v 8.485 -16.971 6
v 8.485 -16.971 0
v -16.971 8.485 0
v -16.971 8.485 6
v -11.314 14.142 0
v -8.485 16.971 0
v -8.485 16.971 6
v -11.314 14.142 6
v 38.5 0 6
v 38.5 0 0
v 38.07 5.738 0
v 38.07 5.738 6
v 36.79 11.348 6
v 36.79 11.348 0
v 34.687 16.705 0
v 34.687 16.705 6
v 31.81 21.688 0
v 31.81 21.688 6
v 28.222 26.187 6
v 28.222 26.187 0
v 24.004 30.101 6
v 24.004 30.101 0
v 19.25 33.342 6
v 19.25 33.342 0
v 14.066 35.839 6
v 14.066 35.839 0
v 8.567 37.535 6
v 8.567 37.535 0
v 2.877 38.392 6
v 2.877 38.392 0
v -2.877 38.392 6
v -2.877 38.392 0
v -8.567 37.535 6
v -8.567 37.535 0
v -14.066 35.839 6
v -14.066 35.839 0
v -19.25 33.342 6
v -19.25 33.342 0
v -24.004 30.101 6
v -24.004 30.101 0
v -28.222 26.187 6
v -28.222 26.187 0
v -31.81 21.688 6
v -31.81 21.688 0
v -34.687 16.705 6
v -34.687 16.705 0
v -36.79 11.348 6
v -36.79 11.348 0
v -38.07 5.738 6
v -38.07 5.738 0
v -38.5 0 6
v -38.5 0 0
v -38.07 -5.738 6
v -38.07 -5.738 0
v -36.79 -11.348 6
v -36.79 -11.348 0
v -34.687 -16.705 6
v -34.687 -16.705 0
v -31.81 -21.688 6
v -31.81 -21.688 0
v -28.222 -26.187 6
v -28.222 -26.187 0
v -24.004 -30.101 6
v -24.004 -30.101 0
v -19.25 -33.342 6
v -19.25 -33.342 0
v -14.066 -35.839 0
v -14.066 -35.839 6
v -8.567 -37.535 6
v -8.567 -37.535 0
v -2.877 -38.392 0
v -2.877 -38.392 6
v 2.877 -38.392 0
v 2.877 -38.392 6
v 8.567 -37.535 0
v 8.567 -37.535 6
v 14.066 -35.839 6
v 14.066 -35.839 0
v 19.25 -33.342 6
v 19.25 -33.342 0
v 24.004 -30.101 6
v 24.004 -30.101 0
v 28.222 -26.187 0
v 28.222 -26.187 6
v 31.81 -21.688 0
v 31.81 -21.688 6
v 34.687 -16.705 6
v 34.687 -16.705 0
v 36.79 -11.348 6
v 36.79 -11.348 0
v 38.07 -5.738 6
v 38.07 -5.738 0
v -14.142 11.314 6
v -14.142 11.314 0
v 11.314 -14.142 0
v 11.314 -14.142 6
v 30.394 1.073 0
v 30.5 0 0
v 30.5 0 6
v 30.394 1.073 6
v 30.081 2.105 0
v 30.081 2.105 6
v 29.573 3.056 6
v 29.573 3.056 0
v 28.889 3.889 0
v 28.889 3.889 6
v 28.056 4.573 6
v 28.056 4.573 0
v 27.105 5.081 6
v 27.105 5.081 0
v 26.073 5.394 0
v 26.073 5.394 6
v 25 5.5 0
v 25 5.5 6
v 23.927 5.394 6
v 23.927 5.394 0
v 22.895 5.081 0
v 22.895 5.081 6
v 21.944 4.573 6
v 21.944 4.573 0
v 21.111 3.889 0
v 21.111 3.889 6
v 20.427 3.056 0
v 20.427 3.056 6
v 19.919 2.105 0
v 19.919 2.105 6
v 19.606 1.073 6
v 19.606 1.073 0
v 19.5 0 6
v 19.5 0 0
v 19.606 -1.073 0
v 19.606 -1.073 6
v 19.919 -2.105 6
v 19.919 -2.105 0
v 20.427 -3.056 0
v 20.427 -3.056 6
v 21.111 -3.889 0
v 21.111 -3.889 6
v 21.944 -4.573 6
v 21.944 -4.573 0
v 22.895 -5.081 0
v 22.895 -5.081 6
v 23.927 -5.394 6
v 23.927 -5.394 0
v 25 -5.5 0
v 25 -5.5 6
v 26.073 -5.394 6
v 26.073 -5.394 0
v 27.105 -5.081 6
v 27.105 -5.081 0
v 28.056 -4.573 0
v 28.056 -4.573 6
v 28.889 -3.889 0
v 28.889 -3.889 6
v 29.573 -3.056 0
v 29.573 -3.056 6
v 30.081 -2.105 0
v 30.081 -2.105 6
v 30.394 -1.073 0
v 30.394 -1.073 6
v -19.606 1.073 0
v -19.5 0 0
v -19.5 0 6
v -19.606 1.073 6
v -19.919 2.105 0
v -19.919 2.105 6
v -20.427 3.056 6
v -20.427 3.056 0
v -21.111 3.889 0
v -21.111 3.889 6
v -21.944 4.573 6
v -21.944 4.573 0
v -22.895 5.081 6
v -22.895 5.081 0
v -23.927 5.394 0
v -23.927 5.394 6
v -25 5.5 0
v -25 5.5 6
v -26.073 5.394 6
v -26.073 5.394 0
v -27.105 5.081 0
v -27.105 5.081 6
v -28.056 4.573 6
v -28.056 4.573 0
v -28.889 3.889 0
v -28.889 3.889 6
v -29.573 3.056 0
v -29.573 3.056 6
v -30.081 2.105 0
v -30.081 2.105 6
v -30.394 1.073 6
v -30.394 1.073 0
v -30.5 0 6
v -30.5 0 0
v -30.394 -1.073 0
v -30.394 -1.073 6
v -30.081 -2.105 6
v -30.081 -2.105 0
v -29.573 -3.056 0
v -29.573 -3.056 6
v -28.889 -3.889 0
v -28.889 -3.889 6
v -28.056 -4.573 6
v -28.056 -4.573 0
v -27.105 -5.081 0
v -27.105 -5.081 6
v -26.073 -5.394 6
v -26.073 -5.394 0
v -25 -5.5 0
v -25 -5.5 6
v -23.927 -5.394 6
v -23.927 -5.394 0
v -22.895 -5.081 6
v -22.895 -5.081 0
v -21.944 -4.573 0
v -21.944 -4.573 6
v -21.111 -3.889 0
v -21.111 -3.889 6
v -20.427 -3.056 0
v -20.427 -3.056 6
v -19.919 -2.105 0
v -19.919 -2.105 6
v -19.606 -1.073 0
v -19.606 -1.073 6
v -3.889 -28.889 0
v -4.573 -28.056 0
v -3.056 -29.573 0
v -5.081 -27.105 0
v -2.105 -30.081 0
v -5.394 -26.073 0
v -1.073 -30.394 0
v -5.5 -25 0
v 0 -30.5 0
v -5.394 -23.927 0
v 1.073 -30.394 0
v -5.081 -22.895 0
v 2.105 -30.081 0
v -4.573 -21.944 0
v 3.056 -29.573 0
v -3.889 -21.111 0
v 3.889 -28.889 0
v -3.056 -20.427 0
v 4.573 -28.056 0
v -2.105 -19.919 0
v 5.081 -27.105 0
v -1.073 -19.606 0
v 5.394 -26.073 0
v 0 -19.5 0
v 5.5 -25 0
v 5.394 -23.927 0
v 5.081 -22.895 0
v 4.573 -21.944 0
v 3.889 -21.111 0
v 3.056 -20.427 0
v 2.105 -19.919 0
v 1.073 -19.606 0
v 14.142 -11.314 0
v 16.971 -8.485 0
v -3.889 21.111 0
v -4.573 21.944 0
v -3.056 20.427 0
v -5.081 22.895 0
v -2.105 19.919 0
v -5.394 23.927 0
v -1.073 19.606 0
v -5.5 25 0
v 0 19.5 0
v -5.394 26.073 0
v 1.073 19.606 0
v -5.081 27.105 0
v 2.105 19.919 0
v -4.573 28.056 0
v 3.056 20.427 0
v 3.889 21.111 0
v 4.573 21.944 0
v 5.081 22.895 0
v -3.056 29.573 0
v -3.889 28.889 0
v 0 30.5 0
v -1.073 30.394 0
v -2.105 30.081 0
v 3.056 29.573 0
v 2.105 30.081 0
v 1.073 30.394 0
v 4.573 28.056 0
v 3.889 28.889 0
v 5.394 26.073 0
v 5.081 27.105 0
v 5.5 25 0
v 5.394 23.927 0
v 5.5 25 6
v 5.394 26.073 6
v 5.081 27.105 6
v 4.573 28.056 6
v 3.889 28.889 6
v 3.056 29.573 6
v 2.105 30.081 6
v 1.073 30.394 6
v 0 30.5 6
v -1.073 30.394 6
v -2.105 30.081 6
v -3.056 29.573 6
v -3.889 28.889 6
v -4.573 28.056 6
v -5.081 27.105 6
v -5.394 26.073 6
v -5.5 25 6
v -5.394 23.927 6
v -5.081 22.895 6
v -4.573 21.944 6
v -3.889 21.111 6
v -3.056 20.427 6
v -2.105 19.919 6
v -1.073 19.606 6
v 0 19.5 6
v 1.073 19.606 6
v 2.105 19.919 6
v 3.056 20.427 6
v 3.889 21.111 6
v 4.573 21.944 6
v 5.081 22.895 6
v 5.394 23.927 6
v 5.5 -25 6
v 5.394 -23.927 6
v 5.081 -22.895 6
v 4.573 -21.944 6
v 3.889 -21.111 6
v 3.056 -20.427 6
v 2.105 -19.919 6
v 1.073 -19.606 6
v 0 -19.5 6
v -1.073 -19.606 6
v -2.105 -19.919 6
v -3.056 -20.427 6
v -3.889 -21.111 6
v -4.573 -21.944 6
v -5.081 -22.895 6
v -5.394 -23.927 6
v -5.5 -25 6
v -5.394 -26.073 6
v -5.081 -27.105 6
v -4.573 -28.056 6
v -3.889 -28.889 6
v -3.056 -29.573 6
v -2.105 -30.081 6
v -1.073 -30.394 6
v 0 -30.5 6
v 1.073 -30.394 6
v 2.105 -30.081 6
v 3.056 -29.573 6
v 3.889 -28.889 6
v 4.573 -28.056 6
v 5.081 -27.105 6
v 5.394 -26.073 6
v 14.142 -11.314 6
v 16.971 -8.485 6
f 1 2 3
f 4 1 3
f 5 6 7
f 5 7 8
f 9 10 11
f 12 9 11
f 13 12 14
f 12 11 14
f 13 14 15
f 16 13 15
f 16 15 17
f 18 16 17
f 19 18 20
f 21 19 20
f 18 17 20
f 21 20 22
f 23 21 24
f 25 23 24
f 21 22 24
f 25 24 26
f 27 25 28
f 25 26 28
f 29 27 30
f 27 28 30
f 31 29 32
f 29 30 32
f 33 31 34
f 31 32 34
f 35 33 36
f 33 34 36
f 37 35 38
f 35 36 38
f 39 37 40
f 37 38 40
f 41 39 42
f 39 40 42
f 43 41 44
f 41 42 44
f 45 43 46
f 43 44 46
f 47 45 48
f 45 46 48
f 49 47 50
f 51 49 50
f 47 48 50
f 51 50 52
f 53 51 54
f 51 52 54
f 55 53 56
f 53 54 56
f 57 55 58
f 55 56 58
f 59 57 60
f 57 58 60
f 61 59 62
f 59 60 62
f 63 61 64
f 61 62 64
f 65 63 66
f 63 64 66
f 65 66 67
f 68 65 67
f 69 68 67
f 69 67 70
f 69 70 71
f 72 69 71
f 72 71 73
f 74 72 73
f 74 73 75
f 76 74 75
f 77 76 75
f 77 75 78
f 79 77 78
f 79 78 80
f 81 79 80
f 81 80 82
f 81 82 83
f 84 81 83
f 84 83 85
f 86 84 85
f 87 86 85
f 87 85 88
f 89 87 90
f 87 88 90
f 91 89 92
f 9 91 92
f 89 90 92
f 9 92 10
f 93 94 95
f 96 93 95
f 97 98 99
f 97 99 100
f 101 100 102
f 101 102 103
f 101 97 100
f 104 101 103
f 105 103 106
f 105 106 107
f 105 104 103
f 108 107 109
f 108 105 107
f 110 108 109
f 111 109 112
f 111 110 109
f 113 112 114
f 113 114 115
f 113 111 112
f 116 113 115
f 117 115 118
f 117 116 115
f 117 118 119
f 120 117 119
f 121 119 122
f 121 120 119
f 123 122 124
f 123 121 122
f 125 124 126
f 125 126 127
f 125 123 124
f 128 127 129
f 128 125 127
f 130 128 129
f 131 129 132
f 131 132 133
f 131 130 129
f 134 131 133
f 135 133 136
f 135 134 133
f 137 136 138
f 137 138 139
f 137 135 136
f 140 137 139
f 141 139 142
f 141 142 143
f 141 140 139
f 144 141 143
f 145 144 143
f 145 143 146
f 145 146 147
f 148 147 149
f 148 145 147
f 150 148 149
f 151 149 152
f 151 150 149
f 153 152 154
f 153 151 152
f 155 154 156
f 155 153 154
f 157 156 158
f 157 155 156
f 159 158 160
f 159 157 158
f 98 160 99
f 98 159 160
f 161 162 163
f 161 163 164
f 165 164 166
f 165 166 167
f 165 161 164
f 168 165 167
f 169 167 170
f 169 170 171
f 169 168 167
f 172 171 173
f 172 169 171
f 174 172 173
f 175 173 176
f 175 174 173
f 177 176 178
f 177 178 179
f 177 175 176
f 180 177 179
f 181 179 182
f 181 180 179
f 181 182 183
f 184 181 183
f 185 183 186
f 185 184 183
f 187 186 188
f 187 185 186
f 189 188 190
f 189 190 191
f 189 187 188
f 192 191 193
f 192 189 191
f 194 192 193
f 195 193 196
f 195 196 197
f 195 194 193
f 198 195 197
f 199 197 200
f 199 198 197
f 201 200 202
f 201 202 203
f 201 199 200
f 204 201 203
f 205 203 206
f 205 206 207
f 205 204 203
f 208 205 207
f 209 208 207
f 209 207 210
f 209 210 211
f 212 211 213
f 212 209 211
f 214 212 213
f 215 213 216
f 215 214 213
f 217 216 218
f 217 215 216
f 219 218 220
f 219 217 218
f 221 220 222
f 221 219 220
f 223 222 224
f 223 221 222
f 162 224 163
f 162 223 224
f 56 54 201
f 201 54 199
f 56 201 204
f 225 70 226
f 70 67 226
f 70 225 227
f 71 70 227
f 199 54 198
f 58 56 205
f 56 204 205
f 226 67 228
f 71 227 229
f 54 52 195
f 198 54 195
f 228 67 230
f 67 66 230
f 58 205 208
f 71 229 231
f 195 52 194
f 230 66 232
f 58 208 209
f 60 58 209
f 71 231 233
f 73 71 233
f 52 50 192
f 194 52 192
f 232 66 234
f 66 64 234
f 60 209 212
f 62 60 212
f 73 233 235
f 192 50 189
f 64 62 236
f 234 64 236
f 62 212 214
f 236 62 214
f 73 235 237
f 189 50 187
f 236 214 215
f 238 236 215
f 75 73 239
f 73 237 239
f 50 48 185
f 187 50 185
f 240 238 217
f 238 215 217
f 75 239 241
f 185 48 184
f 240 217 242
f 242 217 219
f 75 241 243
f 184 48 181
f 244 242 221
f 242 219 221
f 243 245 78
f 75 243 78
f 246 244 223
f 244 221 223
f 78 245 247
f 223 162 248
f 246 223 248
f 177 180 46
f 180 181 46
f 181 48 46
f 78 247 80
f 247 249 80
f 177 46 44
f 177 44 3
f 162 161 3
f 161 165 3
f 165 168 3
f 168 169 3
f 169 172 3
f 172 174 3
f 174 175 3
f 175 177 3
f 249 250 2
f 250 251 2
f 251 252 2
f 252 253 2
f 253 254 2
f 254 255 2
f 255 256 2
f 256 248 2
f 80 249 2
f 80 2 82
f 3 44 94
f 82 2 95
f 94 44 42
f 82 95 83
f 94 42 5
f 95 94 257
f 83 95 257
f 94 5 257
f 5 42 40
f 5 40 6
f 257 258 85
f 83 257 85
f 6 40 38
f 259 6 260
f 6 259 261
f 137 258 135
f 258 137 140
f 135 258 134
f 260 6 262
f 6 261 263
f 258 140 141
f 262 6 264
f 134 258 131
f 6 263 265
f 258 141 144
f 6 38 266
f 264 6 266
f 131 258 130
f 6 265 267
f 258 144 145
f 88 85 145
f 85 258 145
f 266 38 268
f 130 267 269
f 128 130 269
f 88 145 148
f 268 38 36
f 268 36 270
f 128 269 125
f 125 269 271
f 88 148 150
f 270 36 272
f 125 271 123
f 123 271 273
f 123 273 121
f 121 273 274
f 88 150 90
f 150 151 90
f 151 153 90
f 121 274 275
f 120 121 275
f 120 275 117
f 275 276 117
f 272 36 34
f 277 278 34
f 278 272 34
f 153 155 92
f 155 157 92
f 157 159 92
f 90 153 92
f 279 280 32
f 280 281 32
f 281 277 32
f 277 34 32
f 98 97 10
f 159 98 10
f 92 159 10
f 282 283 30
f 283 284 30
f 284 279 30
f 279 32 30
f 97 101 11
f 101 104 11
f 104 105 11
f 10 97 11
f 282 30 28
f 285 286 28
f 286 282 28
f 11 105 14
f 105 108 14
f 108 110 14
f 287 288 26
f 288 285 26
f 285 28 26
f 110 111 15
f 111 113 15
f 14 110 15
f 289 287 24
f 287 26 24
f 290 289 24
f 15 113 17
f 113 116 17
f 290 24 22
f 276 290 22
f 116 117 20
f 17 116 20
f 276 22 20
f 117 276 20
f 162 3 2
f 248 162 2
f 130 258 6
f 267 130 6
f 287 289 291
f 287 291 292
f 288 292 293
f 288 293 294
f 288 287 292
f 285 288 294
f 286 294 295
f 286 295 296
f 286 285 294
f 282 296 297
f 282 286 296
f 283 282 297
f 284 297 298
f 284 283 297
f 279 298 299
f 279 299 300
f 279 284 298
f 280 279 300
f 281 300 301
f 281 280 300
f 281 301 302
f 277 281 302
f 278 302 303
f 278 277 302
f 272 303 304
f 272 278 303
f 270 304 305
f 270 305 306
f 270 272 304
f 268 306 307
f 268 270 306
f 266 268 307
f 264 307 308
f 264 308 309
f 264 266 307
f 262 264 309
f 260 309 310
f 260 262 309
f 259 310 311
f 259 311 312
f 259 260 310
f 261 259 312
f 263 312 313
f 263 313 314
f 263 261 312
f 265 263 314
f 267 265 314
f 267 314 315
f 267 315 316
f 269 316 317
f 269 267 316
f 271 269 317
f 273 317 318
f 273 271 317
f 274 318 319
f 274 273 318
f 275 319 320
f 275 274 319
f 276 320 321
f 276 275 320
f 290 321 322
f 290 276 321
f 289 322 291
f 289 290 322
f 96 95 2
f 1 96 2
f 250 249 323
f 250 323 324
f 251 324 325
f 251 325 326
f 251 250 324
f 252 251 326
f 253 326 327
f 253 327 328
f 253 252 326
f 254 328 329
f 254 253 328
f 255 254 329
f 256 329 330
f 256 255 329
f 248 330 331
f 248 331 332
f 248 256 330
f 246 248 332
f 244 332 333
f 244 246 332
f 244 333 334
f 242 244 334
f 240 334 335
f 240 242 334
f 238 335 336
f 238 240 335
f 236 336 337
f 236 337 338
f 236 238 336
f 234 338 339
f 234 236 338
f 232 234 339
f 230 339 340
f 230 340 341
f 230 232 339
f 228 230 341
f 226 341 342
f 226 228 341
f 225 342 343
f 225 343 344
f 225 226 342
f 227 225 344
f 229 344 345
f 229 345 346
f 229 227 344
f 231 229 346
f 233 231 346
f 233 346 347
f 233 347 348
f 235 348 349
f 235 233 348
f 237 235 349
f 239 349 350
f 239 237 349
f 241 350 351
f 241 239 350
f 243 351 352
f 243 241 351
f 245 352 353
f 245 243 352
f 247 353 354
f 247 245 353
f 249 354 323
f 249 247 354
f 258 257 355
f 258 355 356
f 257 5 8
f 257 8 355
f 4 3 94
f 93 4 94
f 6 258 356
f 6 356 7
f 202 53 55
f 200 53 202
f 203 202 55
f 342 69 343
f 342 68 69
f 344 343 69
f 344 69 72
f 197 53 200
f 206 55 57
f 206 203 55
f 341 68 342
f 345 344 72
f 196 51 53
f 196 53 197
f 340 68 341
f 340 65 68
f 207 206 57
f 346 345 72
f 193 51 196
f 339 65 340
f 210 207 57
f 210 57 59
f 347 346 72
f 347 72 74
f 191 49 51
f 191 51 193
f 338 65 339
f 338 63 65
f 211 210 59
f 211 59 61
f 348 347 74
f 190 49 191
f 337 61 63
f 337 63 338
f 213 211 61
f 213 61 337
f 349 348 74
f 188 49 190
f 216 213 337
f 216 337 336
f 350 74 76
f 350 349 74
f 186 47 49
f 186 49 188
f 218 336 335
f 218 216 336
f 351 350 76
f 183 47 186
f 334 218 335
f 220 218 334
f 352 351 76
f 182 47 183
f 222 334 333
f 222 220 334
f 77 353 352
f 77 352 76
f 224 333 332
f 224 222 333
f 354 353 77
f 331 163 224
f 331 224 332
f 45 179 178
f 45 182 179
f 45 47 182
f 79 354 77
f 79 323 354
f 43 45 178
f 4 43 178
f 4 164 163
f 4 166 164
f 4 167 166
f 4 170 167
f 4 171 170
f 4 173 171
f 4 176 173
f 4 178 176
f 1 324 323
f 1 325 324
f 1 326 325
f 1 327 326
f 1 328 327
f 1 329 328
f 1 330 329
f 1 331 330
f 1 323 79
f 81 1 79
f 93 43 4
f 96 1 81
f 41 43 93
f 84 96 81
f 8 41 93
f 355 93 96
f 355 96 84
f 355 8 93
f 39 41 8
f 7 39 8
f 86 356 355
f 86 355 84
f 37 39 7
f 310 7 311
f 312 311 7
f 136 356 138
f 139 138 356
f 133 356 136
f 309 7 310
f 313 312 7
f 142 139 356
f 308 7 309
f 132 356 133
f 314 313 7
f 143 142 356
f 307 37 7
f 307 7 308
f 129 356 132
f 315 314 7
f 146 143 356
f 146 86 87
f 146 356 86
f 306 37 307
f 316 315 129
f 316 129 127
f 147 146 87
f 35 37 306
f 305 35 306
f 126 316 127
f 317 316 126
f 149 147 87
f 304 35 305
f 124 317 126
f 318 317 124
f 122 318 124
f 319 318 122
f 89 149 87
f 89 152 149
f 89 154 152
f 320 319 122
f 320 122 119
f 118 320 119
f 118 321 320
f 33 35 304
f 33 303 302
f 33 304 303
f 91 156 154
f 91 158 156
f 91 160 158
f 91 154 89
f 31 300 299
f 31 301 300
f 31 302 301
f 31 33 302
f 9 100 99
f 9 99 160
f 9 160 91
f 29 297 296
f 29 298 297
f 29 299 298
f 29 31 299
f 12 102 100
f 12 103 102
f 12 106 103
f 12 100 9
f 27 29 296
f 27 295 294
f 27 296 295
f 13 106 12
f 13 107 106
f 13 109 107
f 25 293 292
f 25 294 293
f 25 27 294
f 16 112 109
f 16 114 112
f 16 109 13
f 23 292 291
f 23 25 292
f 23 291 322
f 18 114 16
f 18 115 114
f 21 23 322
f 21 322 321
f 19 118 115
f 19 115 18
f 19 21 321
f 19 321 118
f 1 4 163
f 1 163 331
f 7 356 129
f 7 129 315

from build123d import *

# Parameters (mm, degrees)
MODEL_R             = 38.5
MODEL_R_2           = 5.5
BOSS_EXTRUDE1_DEPTH = 6


with BuildPart() as part:
    # Model → Boss-Extrude1 (new body)
    with BuildSketch(Plane.XY):
        Circle(MODEL_R)
        with Locations((-25, 0)):
            Circle(MODEL_R_2, mode=Mode.SUBTRACT)
        with Locations((0, 25)):
            Circle(MODEL_R_2, mode=Mode.SUBTRACT)
        with Locations((0, -25)):
            Circle(MODEL_R_2, mode=Mode.SUBTRACT)
        with Locations((25, 0)):
            Circle(MODEL_R_2, mode=Mode.SUBTRACT)
        Polygon((-16.970562748, 8.485281374), (-14.142135624, 11.313708499), (11.313708499, -14.142135624), (8.485281374, -16.970562748), align=None, mode=Mode.SUBTRACT)
        Polygon((-11.313708499, 14.142135624), (14.142135624, -11.313708499), (16.970562748, -8.485281374), (-8.485281374, 16.970562748), align=None, mode=Mode.SUBTRACT)
    extrude(amount=BOSS_EXTRUDE1_DEPTH)


solid = part.part
